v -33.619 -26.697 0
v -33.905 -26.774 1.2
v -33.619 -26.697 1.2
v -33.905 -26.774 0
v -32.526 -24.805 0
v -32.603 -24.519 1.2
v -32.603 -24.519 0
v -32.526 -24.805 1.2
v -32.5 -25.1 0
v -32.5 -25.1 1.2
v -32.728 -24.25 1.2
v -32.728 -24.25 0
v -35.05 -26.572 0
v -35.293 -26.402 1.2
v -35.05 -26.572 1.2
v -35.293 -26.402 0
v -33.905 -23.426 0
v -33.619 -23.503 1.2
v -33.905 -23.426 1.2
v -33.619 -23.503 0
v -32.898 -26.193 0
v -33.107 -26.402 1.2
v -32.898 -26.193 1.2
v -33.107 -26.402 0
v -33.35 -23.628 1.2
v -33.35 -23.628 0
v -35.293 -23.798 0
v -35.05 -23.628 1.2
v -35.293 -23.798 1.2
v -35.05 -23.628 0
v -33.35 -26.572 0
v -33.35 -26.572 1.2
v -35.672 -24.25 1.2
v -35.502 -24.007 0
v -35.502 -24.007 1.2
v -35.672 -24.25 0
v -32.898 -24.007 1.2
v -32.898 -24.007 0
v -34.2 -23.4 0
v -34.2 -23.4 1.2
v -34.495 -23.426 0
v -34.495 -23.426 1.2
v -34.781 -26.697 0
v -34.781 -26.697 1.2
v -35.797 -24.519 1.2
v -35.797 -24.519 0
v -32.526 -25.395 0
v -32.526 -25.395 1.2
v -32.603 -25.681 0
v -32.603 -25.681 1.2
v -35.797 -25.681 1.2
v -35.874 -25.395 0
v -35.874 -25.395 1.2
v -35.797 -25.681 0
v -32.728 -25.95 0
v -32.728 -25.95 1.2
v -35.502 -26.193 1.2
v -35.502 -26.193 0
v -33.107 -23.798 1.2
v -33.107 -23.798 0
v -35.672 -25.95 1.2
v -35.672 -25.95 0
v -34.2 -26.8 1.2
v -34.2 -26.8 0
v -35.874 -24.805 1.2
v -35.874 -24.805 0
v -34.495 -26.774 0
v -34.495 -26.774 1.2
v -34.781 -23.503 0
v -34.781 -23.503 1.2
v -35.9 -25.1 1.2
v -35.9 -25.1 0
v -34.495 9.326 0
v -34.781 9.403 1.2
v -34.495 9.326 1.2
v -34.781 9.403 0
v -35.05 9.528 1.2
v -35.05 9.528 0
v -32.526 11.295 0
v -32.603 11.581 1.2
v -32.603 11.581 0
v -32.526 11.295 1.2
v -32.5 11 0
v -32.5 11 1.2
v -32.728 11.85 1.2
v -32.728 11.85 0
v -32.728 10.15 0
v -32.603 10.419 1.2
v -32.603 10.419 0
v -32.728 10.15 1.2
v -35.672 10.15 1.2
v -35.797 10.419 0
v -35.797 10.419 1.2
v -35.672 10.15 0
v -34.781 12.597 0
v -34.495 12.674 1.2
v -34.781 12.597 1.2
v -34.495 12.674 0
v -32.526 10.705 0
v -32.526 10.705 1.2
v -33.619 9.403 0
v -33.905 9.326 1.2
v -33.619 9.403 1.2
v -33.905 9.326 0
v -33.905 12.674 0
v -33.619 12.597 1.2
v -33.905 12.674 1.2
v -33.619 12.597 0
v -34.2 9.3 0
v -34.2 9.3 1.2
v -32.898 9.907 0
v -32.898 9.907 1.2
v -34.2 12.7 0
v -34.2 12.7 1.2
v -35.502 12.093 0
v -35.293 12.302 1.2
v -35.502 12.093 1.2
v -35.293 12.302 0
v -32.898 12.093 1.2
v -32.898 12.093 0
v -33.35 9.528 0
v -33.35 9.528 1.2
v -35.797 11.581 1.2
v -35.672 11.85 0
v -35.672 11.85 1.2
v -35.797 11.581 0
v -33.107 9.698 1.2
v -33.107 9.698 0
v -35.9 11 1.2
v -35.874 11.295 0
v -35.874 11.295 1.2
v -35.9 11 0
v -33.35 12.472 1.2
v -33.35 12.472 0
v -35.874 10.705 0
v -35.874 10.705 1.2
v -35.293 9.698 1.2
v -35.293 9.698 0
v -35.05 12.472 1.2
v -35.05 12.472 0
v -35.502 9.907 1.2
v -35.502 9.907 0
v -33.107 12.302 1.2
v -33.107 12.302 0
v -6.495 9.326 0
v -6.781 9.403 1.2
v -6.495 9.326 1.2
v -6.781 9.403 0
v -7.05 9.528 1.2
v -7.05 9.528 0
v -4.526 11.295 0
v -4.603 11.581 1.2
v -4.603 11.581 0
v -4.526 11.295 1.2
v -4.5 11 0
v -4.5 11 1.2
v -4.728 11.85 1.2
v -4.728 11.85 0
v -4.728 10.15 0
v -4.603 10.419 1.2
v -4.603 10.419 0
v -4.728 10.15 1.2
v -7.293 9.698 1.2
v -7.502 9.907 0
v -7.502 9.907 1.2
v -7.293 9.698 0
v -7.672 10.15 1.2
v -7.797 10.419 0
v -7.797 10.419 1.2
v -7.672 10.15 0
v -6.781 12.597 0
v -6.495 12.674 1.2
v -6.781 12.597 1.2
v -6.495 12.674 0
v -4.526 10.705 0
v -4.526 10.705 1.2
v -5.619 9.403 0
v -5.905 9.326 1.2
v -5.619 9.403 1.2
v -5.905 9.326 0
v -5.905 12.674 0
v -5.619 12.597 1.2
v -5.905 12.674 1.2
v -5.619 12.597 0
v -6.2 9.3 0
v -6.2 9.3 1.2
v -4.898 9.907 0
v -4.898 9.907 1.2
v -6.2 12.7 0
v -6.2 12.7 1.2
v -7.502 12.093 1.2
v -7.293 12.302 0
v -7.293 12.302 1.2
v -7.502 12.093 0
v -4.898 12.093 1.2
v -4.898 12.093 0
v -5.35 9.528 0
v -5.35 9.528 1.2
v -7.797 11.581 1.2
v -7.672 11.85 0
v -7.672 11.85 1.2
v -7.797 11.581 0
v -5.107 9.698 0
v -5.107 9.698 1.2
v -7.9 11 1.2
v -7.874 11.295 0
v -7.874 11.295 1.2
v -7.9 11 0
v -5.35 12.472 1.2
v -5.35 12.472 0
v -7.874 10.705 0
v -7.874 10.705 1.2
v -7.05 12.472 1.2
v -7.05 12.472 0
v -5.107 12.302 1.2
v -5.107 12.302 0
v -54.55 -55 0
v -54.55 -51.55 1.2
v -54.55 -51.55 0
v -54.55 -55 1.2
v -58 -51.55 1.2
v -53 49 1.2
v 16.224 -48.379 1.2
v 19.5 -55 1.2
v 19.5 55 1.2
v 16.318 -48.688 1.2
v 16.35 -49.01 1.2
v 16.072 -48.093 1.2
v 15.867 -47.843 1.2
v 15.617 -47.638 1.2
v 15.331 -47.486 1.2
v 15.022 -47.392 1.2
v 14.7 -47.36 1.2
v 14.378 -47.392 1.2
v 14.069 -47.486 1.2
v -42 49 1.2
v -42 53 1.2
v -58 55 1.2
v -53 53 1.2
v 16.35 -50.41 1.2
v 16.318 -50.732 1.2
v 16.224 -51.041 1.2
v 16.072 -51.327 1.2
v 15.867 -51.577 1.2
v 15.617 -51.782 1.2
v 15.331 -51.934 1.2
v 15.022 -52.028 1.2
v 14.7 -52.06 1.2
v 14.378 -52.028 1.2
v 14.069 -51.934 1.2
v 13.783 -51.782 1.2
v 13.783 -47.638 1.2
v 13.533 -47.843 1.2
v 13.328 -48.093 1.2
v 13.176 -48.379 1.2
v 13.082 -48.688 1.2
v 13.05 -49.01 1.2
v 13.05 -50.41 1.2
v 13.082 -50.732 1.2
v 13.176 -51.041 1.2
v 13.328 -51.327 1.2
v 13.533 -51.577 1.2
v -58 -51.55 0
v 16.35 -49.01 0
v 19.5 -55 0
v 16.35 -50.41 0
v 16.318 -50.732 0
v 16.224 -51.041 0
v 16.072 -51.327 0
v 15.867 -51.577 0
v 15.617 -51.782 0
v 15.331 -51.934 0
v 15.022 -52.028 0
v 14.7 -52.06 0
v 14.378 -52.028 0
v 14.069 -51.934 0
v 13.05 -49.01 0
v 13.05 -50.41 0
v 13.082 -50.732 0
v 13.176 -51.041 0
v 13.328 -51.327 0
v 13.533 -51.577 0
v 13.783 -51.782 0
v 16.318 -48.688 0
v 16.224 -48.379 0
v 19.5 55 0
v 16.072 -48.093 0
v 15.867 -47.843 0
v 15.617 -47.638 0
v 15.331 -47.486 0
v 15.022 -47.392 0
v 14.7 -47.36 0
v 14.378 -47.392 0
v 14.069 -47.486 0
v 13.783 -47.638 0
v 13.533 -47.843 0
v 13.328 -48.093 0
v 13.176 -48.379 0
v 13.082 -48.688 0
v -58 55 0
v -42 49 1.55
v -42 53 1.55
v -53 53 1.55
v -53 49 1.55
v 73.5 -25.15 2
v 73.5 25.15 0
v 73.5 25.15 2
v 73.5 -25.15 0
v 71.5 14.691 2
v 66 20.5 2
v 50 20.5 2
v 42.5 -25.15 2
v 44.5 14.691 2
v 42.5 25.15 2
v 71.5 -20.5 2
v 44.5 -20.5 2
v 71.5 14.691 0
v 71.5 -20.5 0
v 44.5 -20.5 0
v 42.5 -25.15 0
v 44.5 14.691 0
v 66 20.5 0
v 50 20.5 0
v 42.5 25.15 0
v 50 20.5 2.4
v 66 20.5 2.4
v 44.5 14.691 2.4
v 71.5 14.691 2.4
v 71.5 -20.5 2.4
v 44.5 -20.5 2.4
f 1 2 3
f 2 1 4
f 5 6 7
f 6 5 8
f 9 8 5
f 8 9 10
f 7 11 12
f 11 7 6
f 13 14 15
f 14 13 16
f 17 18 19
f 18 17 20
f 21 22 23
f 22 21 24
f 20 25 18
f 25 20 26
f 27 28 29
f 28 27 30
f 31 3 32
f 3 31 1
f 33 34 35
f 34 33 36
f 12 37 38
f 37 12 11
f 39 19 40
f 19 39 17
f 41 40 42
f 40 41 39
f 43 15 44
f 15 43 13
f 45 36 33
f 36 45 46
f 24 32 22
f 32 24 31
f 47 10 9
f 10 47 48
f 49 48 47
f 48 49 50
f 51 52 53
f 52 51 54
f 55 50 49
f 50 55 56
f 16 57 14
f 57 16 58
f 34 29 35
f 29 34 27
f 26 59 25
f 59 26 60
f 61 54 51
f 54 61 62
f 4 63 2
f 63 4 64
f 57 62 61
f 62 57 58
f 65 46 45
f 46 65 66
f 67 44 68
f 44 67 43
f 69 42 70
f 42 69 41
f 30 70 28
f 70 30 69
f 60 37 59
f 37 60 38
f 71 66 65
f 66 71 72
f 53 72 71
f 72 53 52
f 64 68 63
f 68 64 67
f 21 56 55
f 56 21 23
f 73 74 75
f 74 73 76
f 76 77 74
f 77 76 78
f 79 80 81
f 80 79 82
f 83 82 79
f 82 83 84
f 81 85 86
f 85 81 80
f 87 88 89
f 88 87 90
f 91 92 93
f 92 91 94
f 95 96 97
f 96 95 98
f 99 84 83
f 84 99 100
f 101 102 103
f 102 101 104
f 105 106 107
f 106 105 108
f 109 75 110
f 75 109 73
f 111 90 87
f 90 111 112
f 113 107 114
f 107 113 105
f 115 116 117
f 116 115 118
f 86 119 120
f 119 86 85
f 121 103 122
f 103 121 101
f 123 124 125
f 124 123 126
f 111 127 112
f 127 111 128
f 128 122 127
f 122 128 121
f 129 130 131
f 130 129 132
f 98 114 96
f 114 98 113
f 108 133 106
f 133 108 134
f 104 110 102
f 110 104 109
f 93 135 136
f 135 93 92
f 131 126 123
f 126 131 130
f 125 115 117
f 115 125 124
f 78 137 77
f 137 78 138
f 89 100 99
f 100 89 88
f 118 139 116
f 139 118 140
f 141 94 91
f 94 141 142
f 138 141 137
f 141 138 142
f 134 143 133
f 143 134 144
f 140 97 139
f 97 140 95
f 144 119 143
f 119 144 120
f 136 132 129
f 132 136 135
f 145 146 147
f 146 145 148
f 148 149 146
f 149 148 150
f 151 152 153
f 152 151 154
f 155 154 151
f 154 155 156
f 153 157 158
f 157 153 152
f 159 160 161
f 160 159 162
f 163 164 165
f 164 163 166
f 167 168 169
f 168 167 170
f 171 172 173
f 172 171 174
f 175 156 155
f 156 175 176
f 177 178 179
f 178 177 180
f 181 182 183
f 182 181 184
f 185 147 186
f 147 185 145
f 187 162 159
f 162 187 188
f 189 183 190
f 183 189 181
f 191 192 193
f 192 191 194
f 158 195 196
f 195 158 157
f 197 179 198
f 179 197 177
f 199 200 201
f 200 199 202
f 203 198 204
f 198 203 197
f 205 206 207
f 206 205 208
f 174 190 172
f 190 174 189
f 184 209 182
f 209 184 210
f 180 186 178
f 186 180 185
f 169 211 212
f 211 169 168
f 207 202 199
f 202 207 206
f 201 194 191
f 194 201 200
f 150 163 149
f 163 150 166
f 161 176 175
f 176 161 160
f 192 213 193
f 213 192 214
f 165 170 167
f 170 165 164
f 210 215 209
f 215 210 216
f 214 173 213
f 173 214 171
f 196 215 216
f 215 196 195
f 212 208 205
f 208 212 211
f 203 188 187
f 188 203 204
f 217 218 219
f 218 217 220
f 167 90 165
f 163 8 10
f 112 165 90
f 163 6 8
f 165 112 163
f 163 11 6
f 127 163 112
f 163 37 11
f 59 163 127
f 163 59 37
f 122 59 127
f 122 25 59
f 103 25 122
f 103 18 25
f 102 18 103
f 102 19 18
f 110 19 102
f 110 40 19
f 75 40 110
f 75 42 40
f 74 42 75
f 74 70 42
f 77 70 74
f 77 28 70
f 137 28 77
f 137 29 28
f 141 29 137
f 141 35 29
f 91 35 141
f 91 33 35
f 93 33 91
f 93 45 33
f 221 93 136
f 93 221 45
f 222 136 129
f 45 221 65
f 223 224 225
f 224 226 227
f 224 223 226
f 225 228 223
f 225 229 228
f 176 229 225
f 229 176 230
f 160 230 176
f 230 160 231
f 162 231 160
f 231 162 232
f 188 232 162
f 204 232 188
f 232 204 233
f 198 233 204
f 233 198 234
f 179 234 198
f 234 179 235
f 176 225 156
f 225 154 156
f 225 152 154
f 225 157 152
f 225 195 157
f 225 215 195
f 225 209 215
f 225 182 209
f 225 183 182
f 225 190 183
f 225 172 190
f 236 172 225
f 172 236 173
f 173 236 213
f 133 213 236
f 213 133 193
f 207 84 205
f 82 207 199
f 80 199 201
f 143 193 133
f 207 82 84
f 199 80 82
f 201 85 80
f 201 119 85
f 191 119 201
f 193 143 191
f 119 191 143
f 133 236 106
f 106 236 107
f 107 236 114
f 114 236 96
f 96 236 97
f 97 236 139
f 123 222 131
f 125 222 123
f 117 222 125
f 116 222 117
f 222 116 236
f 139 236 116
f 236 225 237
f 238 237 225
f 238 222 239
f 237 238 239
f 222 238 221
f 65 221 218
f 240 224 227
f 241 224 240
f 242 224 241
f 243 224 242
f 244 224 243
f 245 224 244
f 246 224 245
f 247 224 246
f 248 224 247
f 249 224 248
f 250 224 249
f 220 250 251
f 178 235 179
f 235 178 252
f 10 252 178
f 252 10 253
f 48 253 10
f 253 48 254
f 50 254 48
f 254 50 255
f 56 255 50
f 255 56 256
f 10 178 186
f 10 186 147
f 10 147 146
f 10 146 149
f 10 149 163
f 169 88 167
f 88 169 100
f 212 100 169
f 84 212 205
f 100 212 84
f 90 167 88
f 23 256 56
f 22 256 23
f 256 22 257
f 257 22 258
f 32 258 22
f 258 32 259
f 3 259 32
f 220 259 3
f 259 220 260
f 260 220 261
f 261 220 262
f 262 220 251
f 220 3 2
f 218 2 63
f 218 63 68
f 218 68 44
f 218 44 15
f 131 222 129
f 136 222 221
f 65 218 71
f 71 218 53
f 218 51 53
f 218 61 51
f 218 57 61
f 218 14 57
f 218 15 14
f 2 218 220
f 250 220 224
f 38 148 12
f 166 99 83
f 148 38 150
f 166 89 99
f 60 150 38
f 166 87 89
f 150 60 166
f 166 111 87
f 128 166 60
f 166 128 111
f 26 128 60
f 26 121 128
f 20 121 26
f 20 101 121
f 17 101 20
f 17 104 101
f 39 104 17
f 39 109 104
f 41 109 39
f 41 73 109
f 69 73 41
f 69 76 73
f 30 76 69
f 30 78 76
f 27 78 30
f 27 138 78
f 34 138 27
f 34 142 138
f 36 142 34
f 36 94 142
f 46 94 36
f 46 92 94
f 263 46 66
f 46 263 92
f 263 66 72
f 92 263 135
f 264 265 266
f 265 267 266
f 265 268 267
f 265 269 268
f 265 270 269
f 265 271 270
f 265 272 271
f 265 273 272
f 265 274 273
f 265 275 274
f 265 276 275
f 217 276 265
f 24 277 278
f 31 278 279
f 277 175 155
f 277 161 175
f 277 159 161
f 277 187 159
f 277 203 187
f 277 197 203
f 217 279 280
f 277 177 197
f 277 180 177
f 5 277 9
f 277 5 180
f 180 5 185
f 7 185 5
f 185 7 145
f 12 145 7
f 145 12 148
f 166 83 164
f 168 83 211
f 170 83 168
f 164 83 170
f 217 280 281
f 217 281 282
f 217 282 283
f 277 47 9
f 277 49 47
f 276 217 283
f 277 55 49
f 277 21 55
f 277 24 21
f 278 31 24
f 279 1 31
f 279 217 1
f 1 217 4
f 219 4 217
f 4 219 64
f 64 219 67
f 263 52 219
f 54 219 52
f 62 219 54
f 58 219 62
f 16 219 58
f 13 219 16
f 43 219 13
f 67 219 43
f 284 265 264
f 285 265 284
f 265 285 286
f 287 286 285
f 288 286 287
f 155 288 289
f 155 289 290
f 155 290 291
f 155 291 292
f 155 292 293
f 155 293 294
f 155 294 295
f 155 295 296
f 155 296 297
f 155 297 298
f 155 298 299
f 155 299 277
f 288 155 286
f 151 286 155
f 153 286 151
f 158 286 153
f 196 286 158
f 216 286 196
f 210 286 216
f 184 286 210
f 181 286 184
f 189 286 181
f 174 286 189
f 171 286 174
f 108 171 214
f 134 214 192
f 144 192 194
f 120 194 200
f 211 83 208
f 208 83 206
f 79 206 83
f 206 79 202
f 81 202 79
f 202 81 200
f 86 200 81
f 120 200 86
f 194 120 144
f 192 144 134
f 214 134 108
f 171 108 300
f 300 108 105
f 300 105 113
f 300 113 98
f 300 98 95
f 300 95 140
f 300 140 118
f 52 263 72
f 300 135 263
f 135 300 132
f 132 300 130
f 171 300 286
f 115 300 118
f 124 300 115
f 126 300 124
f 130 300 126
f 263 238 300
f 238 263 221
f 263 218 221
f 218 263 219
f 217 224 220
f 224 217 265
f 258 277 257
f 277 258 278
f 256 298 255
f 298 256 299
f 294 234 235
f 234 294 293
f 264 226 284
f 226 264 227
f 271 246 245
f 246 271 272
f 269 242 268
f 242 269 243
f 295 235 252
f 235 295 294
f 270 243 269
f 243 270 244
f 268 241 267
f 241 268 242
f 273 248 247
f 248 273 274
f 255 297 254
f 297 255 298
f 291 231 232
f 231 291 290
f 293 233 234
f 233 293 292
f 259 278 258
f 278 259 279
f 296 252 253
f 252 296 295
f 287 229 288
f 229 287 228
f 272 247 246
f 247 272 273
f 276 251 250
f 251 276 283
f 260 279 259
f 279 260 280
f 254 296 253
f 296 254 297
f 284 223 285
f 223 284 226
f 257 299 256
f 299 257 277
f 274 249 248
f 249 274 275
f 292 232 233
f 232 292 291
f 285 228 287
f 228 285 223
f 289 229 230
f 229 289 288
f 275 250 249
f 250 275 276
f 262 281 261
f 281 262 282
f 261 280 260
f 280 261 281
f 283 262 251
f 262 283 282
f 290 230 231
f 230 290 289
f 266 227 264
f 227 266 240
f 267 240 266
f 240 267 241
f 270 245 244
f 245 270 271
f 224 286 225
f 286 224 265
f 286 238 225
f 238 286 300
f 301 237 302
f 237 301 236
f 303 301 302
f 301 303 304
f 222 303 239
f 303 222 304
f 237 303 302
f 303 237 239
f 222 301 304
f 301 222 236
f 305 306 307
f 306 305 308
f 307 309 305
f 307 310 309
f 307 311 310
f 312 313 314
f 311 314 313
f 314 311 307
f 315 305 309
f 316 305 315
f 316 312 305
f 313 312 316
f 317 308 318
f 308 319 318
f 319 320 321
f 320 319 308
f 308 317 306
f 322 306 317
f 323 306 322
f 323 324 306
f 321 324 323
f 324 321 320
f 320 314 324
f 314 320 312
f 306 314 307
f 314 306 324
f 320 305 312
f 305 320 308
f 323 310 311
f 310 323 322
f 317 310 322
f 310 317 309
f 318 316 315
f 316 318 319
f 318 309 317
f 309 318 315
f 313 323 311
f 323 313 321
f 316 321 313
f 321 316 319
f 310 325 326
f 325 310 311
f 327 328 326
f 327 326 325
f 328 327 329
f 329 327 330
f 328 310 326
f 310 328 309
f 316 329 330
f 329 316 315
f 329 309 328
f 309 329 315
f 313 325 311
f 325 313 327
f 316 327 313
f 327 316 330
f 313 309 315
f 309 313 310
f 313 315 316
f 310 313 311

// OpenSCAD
// file: lib/iec-c14-fused-switch.scad
/* Owner-measured fused switched IEC C14 inlet; dimensions in millimetres. */

function iecc14_faceplate_size() = [31, 50.3, 2];
function iecc14_body_profile_size() = [27, 41];
function iecc14_body_depth() = 21.8;
function iecc14_top_straight_length() = 16;
function iecc14_chamfer_edge_length() = 8;
function iecc14_chamfer_rise() = sqrt(pow(iecc14_chamfer_edge_length(), 2) - pow((iecc14_body_profile_size().x - iecc14_top_straight_length()) / 2, 2));
function iecc14_tab_depth_widths() = [8, 5.5];
function iecc14_tab_height() = 5;
function iecc14_tab_top_setback() = 10.5;
function iecc14_tab_relief() = 1;
function iecc14_tab_lateral_inset_assumption() = 4.5;
function iecc14_terminal_projection_known() = false;

module iecc14_contract() {
    assert(iecc14_faceplate_size() == [31, 50.3, 2], "IEC corrected faceplate envelope changed");
    assert(iecc14_body_depth() == 21.8, "IEC corrected plastic-body depth changed");
    assert(iecc14_tab_height() == 5, "IEC tab height is 5 mm, never the rejected 4.5 mm interpretation");
    assert(iecc14_tab_relief() == 1 && iecc14_tab_top_setback() == 10.5,
           "IEC three-sided relief or top setback changed");
    assert(abs(sqrt(pow((iecc14_body_profile_size().x - iecc14_top_straight_length()) / 2, 2) + pow(iecc14_chamfer_rise(), 2)) - 8) < 0.001,
           "IEC literal diagonal chamfer edges must remain 8 mm");
    assert(!iecc14_terminal_projection_known(), "IEC terminal projection remains unmeasured");
    children();
}

module iecc14_panel_profile_2d(clearance = 0) {
    w = iecc14_body_profile_size().x + 2 * clearance;
    h = iecc14_body_profile_size().y + 2 * clearance;
    rise = iecc14_chamfer_rise();
    polygon([[-w/2, -h/2], [w/2, -h/2], [w/2, h/2-rise],
             [iecc14_top_straight_length()/2, h/2],
             [-iecc14_top_straight_length()/2, h/2], [-w/2, h/2-rise]]);
}

// Independently callable panel negative, front face at Z=0 and body behind +Z.
module iecc14_panel_cutout_negative(depth = 24, clearance = 0) {
    iecc14_contract()
        translate([0, 0, -0.01]) linear_extrude(height = depth + 0.02)
            iecc14_panel_profile_2d(clearance);
}

module iecc14_locking_tab(side = "left", depth_width = 8) {
    assert(side == "left" || side == "right", "IEC tab side must be left or right");
    assert(depth_width == 8 || depth_width == 5.5, "IEC tab along-depth width changed");
    x = (side == "left" ? -1 : 1) * iecc14_body_profile_size().x / 2;
    y = (side == "left" ? 1 : -1) *
        (iecc14_body_profile_size().y / 2 - iecc14_tab_lateral_inset_assumption() - iecc14_tab_height() / 2);
    // Thin tongue remains connected at its bottom; the surrounding 1 mm gap
    // is represented in evidence by the contrasting parent side wall.
    translate([x - (side == "left" ? 0.6 : 0), y,
               iecc14_tab_top_setback()])
        cube([0.6, iecc14_tab_height(), depth_width]);
}

module iecc14_tab_relief_negatives(side = "left", depth_width = 8) {
    x = (side == "left" ? -1 : 1) * iecc14_body_profile_size().x / 2;
    y = (side == "left" ? 1 : -1) *
        (iecc14_body_profile_size().y / 2 - iecc14_tab_lateral_inset_assumption() - iecc14_tab_height() / 2);
    cut_x = side == "left" ? x - 0.01 : x - 1.19;
    cut_z = iecc14_tab_top_setback();
    // Longitudinal side profile: 1 mm relief on top/left/right, with the
    // entire lower edge left joined to the parent wall.
    translate([cut_x, y + iecc14_tab_height()/2, cut_z - iecc14_tab_relief()])
        cube([1.2, iecc14_tab_relief(), depth_width + 2*iecc14_tab_relief()]);
    for (z = [cut_z - iecc14_tab_relief(), cut_z + depth_width])
        translate([cut_x, y - iecc14_tab_height()/2, z])
            cube([1.2, iecc14_tab_height() + iecc14_tab_relief(), iecc14_tab_relief()]);
}

module iecc14_keepout(include_schematic_terminals = false) {
    iecc14_contract() {
        union() {
            translate([-iecc14_faceplate_size().x/2, -iecc14_faceplate_size().y/2,
                       -iecc14_faceplate_size().z])
                cube(iecc14_faceplate_size());
            difference() {
                linear_extrude(height = iecc14_body_depth()) iecc14_panel_profile_2d();
                iecc14_tab_relief_negatives("left", iecc14_tab_depth_widths().x);
                iecc14_tab_relief_negatives("right", iecc14_tab_depth_widths().y);
            }
            if (include_schematic_terminals)
                // Schematic only: not part of the measured keep-out contract.
                color([0.85, 0.55, 0.12]) translate([-7, -8, iecc14_body_depth()])
                    cube([14, 16, 3]);
        }
    }
}

module iecc14_evidence(view = "front") {
    iecc14_contract() {
        if (view == "front") {
            color([0.12, 0.13, 0.14])
                difference() {
                    translate([-31/2, -50.3/2, -2]) cube(iecc14_faceplate_size());
                    translate([0, 0, -2.01]) linear_extrude(height = 2.02)
                        iecc14_panel_profile_2d();
                }
            color([0.25, 0.27, 0.29]) linear_extrude(height = 0.4) iecc14_panel_profile_2d();
        } else if (view == "side") {
            color([0.12, 0.13, 0.14]) iecc14_keepout();
            // Semantic overlay identifies the flexible tongues; it does not
            // participate in the printable/exported keep-out.
            color([0.90, 0.42, 0.10]) {
                iecc14_locking_tab("left", 8);
                iecc14_locking_tab("right", 5.5);
            }
        } else if (view == "rear") {
            color([0.12, 0.13, 0.14])
                linear_extrude(height = 0.8) iecc14_panel_profile_2d();
            // Orange rectangle is explicitly schematic, not a terminal
            // projection measurement or a keep-out claim.
            color([0.85, 0.55, 0.12])
                translate([-7, -8, 0.8]) cube([14, 16, 0.8]);
        } else assert(false, str("Unknown IEC C14 evidence view: ", view));
    }
}
// file: lib/alt-1205t-power-supply.scad
/*
 * Source-owned semantic model of the owner-measured ALT-1205T 12 V / 5 A PSU.
 *
 * Datum: underside top-left corner; +X right, +Y down, +Z toward the label
 * side.  Dimensions are physical millimetres.  See alt-1205t-power-supply.md
 * for private-evidence provenance and deliberately unresolved measurements.
 */

function alt1205t_base_size() = [77.5, 110];
function alt1205t_label_side_size() = [110, 36.86];
function alt1205t_upper_left_aperture_size() = [3.45, 3.45];
function alt1205t_upper_right_slot_size() = [3.3, 4.7];
function alt1205t_upper_right_slot_top_tangent() = 2.94;
function alt1205t_upper_right_slot_right_tangent() = 3.15;
function alt1205t_m3_centres() = [[23.8, 29.9], [23.8, 66], [51.8, 66]];
function alt1205t_label_upper_left_hole_diameter() = 3.4;
function alt1205t_label_upper_left_hole_centre() = [3.15, 6.6];
function alt1205t_label_second_m3_centre() = [8.5, 36.86 - 17.25];
function alt1205t_label_top_right_slot_height() = 6.9;
function alt1205t_label_lower_right_hole_diameter() = 4;
function alt1205t_label_lower_right_hole_centre() = [110 - 11.16, 36.86 - 12.32];
function alt1205t_lower_left_unresolved_leaders() = [5.75, 4, 10.4, 2.28, 2.61];
function alt1205t_upper_right_square_is_hole() = false;

module alt1205t_contract() {
    assert(alt1205t_base_size() == [77.5, 110], "ALT-1205T base datum changed");
    assert(alt1205t_label_side_size() == [110, 36.86], "ALT-1205T corrected label height changed");
    assert(alt1205t_upper_right_slot_top_tangent() == 2.94, "ALT-1205T corrected upper slot inset changed");
    assert(alt1205t_label_lower_right_hole_centre() == [98.84, 24.54], "ALT-1205T corrected lower-right offsets changed");
    assert(len(alt1205t_m3_centres()) == 3, "ALT-1205T coupon pattern must contain exactly three unequivocal M3 holes");
    assert(!alt1205t_upper_right_square_is_hole(), "ALT-1205T upper-right square is explicitly not a hole");
    children();
}

module alt1205t_oblong_negative(size, depth) {
    hull()
        for (y = [size.x / 2, size.y - size.x / 2])
            translate([size.x / 2, y, -0.01])
                cylinder(d = size.x, h = depth + 0.02, $fn = 32);
}

// Independently callable negative used by the later fit coupon.
module alt1205t_mounting_negatives(depth = 3, clearance_diameter = 3.4) {
    alt1205t_contract() {
        for (centre = alt1205t_m3_centres())
            translate([centre.x, centre.y, -0.01])
                cylinder(d = clearance_diameter, h = depth + 0.02, $fn = 36);

        translate([0, 0, 0])
            cube([alt1205t_upper_left_aperture_size().x,
                  alt1205t_upper_left_aperture_size().y, depth]);

        slot = alt1205t_upper_right_slot_size();
        translate([alt1205t_base_size().x - alt1205t_upper_right_slot_right_tangent() - slot.x,
                   alt1205t_upper_right_slot_top_tangent(), 0])
            alt1205t_oblong_negative(slot, depth);
    }
}

// Conservative solid keep-out: measured metal envelope only. Terminal/wire
// projection is intentionally excluded because no trustworthy envelope exists.
module alt1205t_keepout() {
    alt1205t_contract()
        cube([alt1205t_base_size().x, alt1205t_base_size().y,
              alt1205t_label_side_size().y]);
}

module alt1205t_evidence(view = "underside") {
    alt1205t_contract() {
        if (view == "underside") {
            color([0.68, 0.70, 0.72])
                difference() {
                    cube([alt1205t_base_size().x, alt1205t_base_size().y, 1.2]);
                    alt1205t_mounting_negatives(1.2);
                }
            // Ambiguous lower-left leaders: evidence marker, never a hole.
            color([0.95, 0.55, 0.08, 0.75])
                translate([5, 104, 1.2]) cube([11, 4, 0.35]);
        } else if (view == "label_side") {
            color([0.68, 0.70, 0.72])
                linear_extrude(height = 1.2)
                    difference() {
                            square(alt1205t_label_side_size());
                            translate(alt1205t_label_upper_left_hole_centre())
                                circle(d = alt1205t_label_upper_left_hole_diameter(), $fn = 32);
                            translate(alt1205t_label_second_m3_centre()) circle(d = 3, $fn = 32);
                            translate(alt1205t_label_lower_right_hole_centre())
                                circle(d = alt1205t_label_lower_right_hole_diameter(), $fn = 32);
                            translate([110 - 3.5, 0]) square([3.5, alt1205t_label_top_right_slot_height()]);
                    }
        } else if (view == "side") {
            color([0.68, 0.70, 0.72]) alt1205t_keepout();
        } else assert(false, str("Unknown ALT-1205T evidence view: ", view));
    }
}
// main file
use <lib/alt-1205t-power-supply.scad>
use <lib/iec-c14-fused-switch.scad>

PART = "power_system_review";
VIEW = "front";

if (PART == "alt_1205t_psu")
    alt1205t_keepout();
else if (PART == "alt_1205t_psu_mounting_negatives")
    alt1205t_mounting_negatives();
else if (PART == "alt_1205t_psu_evidence")
    alt1205t_evidence(VIEW);
else if (PART == "iec_c14_fused_switch")
    iecc14_keepout();
else if (PART == "iec_c14_panel_cutout_negative")
    iecc14_panel_cutout_negative();
else if (PART == "iec_c14_fused_switch_evidence")
    iecc14_evidence(VIEW);
else if (PART == "power_system_review") {
    translate([-58, -55, 0]) alt1205t_evidence("underside");
    translate([58, 0, 2]) iecc14_evidence("front");
} else
    assert(false, str("Unknown power-system PART: ", PART));
